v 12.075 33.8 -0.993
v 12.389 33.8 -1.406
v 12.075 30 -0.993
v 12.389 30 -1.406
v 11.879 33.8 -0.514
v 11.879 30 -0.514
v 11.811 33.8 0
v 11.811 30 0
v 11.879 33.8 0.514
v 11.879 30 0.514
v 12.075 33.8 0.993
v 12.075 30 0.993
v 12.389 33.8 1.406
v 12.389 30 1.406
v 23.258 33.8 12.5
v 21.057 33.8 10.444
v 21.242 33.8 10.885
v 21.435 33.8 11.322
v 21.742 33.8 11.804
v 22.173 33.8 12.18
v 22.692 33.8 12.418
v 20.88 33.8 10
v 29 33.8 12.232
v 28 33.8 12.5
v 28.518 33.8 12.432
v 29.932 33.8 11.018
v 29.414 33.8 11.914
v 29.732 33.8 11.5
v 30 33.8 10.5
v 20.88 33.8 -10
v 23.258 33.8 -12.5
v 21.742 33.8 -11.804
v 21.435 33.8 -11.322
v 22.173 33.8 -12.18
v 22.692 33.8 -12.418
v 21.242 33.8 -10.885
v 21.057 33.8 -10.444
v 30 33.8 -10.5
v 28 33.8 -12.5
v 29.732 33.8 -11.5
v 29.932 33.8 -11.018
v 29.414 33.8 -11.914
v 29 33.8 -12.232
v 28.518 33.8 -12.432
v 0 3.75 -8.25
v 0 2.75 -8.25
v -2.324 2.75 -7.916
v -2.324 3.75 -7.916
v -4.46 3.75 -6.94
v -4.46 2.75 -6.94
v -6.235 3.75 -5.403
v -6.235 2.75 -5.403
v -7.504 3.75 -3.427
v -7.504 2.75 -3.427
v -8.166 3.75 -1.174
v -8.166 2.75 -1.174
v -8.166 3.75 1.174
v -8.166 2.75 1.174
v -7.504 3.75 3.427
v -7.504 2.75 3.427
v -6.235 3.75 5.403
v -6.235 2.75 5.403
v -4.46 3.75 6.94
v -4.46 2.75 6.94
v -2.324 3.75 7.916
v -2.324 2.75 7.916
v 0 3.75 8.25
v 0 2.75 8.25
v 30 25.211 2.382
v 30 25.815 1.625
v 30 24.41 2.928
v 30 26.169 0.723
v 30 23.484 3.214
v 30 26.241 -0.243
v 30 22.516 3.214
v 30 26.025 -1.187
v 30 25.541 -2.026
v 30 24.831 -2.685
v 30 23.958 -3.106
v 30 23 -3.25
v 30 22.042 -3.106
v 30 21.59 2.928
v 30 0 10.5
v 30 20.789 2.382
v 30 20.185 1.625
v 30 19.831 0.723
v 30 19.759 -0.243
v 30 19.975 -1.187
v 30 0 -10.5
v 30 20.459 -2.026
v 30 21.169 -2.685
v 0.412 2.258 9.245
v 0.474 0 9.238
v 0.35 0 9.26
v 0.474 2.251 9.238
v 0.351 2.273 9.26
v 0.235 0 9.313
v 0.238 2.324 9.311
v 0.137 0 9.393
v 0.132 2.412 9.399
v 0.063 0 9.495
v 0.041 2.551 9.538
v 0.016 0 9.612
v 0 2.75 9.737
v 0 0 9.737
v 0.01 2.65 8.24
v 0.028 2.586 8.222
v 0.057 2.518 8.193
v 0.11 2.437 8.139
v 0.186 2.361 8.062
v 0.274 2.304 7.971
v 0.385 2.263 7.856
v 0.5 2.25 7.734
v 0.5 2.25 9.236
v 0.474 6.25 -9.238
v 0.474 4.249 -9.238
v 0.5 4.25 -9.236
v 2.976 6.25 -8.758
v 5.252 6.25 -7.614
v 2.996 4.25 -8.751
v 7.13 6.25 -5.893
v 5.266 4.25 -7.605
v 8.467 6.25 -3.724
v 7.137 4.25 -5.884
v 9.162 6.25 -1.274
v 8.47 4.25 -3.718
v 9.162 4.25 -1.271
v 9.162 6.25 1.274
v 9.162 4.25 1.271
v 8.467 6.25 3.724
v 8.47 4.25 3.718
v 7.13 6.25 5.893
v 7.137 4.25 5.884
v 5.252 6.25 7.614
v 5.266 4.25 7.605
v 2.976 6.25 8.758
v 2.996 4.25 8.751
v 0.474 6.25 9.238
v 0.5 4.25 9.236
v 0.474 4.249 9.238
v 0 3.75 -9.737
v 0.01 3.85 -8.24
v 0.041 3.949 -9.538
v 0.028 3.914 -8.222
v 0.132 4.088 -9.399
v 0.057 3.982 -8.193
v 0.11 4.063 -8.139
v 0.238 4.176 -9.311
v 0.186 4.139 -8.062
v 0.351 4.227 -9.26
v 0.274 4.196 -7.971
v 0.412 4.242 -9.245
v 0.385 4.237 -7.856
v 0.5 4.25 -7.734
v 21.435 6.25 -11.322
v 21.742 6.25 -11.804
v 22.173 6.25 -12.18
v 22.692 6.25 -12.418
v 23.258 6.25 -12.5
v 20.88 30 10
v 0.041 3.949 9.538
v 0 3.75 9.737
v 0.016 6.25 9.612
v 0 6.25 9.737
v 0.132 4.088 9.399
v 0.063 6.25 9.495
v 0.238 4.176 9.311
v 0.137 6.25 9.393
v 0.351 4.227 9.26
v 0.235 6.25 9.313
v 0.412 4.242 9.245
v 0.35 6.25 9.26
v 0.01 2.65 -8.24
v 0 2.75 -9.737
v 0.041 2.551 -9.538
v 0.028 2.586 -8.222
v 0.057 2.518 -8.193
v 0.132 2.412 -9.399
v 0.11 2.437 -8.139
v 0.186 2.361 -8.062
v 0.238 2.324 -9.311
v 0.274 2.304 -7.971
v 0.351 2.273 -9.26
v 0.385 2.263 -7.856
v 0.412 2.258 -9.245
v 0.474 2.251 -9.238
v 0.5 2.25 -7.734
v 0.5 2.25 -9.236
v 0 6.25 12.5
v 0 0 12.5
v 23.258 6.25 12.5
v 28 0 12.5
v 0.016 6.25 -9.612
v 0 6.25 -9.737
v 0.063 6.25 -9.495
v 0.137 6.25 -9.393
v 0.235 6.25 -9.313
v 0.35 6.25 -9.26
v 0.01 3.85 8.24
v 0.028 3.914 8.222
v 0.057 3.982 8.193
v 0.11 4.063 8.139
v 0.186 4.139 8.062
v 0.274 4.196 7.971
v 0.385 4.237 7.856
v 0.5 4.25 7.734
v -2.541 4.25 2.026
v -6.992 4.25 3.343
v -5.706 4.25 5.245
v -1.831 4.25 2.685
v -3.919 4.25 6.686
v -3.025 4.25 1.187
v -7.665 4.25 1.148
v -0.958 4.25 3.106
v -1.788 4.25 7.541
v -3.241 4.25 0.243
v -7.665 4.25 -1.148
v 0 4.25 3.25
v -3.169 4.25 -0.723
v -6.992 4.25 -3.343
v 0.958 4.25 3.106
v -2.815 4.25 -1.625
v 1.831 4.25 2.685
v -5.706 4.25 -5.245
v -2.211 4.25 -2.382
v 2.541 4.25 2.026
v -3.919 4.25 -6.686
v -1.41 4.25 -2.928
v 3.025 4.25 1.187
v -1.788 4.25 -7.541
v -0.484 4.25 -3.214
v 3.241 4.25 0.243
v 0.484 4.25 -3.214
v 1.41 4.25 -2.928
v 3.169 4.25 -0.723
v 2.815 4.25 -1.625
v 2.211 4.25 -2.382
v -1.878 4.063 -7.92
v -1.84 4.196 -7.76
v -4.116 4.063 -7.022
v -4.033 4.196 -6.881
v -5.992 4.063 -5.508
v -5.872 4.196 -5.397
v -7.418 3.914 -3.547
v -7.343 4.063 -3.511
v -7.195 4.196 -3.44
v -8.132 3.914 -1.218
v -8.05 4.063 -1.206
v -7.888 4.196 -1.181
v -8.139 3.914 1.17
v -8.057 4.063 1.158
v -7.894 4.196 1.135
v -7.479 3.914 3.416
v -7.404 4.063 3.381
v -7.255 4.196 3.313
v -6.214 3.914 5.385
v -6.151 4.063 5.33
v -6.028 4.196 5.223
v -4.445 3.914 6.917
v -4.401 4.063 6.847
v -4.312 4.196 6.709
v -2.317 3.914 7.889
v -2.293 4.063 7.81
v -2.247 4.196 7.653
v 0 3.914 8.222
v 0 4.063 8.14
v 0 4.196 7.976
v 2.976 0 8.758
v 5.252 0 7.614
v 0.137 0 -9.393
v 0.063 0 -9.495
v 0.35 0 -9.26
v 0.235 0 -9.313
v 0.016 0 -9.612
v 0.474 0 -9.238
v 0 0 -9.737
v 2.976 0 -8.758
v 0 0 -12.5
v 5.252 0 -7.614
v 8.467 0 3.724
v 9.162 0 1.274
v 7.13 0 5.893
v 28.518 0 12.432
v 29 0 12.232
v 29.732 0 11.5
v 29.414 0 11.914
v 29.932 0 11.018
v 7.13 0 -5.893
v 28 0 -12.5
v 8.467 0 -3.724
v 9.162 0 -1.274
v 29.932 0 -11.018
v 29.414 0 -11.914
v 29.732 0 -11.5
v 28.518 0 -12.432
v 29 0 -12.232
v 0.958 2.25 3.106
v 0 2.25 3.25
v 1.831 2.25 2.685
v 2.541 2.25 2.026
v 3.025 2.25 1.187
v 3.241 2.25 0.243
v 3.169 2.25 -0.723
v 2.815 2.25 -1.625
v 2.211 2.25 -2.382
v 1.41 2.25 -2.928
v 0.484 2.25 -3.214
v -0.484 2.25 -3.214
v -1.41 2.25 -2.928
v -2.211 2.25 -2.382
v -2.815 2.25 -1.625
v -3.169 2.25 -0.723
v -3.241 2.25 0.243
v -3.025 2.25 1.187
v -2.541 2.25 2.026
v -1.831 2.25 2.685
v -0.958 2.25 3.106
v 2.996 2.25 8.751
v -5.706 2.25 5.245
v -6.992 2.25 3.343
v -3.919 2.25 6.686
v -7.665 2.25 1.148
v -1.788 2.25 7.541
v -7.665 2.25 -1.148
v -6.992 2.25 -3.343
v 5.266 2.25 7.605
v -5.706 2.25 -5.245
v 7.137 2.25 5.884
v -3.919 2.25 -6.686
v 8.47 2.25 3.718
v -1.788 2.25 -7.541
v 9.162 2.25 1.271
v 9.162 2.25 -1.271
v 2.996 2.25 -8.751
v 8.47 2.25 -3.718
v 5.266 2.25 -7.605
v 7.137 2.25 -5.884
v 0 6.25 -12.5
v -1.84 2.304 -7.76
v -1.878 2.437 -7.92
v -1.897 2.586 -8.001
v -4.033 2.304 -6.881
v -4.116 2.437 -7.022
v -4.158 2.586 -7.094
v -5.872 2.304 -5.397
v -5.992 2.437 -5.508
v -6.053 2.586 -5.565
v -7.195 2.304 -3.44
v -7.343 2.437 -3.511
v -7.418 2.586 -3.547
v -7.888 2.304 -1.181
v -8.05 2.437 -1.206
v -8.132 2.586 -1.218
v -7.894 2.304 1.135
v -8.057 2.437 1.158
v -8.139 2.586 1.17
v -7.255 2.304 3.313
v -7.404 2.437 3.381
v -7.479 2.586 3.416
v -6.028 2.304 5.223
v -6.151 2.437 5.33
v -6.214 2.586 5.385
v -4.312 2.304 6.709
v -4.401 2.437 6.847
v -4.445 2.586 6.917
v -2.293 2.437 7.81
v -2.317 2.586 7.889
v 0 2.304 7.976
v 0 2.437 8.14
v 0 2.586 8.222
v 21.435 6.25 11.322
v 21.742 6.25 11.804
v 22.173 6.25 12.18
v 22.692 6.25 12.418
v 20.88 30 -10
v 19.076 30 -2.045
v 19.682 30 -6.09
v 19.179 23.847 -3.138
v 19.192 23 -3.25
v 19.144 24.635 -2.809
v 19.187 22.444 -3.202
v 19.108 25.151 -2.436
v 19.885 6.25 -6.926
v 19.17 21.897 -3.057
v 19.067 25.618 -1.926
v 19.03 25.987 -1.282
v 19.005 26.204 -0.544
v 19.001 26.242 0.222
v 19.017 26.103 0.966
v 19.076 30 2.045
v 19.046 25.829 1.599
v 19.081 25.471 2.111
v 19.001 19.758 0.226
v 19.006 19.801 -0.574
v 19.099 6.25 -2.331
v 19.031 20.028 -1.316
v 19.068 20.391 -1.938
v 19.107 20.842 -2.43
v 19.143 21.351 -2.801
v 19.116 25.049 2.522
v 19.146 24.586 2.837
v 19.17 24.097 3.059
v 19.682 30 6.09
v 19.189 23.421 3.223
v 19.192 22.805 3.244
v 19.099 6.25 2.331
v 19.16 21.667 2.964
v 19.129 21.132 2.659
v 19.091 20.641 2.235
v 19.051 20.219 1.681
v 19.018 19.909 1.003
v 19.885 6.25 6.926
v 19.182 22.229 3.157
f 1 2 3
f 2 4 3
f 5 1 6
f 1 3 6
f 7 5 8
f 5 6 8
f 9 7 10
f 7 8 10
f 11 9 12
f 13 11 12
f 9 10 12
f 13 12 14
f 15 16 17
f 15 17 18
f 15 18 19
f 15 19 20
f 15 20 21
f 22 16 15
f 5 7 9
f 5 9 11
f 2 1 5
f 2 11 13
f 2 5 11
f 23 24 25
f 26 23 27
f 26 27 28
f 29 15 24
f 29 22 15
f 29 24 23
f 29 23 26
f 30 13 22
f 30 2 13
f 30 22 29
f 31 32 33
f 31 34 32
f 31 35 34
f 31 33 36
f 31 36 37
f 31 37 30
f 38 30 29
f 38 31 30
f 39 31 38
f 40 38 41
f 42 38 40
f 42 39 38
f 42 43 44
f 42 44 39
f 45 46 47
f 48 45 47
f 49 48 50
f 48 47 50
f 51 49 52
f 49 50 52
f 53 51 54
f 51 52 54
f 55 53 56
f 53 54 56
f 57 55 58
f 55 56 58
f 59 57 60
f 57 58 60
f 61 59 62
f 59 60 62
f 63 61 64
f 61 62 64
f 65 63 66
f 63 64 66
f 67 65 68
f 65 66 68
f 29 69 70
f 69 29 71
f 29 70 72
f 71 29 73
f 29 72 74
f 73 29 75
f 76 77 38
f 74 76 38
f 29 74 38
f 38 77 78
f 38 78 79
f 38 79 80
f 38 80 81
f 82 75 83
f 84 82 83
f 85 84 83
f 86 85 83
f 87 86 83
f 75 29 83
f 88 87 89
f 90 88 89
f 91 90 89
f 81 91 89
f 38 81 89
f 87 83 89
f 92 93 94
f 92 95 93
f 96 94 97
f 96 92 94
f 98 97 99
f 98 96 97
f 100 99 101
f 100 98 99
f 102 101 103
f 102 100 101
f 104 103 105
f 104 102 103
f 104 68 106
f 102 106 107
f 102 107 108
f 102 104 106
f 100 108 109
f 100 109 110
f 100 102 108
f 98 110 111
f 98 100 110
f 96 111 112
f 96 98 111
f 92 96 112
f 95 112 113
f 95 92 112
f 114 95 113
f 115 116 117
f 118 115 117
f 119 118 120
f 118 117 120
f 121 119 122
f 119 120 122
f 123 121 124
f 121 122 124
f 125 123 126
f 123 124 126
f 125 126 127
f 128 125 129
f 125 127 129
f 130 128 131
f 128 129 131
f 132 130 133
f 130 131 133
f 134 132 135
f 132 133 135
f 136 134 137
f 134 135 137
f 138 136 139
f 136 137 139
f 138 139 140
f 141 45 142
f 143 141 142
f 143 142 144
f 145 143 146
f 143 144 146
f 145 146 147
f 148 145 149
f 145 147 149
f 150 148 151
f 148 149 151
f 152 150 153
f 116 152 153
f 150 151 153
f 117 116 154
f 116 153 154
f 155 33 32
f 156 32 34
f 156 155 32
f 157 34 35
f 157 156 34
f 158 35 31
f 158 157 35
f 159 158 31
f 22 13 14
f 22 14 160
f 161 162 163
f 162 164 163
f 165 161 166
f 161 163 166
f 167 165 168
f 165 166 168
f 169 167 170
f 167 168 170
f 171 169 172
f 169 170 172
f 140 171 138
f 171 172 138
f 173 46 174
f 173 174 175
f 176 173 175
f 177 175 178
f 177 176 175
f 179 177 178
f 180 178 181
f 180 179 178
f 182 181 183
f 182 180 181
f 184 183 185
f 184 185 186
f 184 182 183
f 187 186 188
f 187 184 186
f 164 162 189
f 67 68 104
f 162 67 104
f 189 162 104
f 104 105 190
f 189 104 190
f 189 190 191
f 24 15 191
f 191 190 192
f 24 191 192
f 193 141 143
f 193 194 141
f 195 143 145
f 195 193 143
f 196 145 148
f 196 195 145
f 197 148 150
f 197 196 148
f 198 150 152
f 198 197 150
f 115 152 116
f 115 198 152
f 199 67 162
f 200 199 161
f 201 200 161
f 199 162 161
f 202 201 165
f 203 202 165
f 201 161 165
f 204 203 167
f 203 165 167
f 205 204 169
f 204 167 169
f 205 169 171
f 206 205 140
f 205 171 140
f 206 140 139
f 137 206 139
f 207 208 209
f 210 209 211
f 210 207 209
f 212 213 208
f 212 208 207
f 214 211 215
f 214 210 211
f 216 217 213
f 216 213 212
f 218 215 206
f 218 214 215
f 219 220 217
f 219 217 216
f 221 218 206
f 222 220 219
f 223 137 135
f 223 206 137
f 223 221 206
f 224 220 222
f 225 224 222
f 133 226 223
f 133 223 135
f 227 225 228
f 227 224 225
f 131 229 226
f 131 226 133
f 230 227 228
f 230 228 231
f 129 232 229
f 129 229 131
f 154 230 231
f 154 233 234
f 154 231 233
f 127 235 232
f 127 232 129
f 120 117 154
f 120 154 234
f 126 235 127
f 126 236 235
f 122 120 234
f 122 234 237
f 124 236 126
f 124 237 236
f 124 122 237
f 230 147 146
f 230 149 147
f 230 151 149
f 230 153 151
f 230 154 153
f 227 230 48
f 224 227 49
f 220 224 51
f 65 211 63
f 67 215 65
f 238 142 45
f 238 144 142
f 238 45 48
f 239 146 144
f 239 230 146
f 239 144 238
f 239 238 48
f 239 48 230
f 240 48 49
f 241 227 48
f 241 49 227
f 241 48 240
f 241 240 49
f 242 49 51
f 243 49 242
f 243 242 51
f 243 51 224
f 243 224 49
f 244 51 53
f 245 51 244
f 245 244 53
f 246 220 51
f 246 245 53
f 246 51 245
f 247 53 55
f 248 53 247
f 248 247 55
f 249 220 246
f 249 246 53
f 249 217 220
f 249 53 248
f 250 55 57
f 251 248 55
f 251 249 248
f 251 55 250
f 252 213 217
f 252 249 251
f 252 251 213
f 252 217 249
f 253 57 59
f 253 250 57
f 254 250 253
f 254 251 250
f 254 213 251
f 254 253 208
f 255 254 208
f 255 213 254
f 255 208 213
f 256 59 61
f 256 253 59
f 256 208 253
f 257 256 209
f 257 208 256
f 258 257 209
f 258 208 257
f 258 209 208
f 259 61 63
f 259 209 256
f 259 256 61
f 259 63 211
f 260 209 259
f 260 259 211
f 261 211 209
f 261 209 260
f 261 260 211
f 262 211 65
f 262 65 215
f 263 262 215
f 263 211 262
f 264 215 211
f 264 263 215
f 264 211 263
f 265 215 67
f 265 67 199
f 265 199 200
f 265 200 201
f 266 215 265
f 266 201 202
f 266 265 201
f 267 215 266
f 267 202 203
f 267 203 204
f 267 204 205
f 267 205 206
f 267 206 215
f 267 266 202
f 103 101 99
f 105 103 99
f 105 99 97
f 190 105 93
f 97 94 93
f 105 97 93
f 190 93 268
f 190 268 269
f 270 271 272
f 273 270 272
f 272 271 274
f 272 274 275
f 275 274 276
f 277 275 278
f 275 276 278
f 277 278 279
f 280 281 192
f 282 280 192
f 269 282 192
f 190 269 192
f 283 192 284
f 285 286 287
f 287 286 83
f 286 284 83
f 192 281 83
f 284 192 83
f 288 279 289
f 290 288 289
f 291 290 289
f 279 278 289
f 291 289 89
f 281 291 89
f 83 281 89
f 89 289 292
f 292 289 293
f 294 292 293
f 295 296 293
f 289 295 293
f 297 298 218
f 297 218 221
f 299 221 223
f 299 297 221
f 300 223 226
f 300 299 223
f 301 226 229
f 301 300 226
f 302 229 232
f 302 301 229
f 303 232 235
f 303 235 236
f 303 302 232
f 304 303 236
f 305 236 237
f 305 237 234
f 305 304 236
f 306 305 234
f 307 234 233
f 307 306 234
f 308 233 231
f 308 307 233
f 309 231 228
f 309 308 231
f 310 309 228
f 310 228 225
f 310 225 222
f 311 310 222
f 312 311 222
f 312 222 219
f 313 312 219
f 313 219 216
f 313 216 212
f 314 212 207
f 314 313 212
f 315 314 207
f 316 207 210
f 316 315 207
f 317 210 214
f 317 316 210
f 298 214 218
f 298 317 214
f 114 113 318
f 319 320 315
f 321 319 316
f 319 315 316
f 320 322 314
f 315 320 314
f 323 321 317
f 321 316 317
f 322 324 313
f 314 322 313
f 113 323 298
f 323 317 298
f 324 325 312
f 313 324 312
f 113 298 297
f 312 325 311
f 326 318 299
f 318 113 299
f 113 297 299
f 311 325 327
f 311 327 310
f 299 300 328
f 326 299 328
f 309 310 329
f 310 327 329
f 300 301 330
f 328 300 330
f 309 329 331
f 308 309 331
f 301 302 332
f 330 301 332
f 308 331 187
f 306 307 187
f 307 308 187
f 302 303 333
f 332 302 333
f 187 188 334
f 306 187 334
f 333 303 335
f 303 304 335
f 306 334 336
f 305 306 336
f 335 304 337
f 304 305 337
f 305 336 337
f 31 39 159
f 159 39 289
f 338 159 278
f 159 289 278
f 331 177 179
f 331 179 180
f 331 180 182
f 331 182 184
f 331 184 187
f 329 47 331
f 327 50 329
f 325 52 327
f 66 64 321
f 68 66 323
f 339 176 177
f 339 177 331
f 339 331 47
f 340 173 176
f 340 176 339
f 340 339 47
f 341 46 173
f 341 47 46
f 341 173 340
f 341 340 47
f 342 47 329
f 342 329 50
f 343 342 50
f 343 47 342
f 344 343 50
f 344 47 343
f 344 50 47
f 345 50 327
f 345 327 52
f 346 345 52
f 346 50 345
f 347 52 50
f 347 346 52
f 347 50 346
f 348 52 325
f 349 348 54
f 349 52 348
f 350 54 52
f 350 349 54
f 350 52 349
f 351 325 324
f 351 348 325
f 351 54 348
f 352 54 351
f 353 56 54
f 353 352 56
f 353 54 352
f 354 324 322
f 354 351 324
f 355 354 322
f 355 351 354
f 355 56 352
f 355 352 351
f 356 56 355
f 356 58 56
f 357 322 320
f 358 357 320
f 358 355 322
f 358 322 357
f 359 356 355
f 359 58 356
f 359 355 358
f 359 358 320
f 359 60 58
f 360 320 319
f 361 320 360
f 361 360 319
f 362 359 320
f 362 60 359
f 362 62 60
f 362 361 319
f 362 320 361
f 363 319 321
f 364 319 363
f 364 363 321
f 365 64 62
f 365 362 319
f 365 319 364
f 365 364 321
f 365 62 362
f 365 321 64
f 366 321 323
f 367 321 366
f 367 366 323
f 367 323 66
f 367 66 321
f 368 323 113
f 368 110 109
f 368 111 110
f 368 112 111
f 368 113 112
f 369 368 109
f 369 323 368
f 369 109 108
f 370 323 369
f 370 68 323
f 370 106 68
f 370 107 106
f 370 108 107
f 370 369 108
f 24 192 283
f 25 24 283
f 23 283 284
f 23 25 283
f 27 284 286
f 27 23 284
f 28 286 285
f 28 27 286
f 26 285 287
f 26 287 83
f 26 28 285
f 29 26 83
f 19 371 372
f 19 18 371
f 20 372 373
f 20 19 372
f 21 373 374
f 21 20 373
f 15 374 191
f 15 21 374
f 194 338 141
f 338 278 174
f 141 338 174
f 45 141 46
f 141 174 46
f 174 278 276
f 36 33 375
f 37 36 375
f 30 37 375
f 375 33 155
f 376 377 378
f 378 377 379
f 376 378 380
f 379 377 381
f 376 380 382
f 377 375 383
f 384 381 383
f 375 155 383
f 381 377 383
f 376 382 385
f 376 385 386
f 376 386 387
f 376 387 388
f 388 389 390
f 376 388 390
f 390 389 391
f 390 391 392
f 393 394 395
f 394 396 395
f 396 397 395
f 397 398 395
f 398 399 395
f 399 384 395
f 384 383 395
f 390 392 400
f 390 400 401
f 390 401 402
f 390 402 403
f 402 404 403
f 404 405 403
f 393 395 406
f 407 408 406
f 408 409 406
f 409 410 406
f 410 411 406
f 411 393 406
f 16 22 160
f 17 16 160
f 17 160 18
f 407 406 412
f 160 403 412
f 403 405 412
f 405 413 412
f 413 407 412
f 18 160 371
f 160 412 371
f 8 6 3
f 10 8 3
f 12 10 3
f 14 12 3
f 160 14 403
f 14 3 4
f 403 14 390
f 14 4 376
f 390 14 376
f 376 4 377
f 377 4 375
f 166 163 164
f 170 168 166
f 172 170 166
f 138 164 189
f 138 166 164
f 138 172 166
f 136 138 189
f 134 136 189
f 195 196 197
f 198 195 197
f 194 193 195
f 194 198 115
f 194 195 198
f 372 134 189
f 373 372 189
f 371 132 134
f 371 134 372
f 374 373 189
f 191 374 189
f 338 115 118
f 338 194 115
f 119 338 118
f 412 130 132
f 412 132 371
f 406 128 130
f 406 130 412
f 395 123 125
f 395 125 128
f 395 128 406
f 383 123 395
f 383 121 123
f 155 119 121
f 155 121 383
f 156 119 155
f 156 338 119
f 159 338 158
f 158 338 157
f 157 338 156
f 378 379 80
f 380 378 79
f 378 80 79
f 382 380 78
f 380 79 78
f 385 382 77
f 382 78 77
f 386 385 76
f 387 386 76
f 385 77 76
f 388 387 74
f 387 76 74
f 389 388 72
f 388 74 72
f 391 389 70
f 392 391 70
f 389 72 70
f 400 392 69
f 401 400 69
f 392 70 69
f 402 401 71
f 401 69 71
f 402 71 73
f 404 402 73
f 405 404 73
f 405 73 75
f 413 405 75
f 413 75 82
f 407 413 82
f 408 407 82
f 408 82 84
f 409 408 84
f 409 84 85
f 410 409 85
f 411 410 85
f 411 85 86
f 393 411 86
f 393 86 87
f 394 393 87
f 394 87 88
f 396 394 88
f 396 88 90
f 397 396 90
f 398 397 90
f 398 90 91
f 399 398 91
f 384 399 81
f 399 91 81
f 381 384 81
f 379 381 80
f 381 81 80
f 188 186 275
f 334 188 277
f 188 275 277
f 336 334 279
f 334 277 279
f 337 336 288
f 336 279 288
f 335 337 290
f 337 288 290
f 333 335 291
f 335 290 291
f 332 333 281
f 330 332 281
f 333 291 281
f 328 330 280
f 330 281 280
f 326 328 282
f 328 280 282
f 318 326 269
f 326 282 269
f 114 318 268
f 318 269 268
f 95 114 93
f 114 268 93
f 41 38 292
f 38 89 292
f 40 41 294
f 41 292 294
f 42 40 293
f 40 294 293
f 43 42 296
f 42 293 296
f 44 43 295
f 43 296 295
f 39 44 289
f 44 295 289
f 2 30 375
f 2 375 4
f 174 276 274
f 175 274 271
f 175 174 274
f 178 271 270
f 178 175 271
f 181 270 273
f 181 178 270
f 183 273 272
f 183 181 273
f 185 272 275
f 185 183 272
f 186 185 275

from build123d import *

# Parameters (mm, degrees)
BOSS_EXTRUDE1_DEPTH     = 2.25
BOSS_EXTRUDE2_START     = 2.25
SKETCH1_4_R             = 3.25
BOSS_EXTRUDE2_DEPTH     = 2
BOSS_EXTRUDE3_START     = 4.25
BOSS_EXTRUDE3_DEPTH     = 2
BOSS_EXTRUDE6_DEPTH     = 33.8
BOSS_EXTRUDE7_DEPTH     = 3.8
FILLET1_R               = 2
FILLET2_R               = 2
FILLET3_R               = 0.5
CUT_EXTRUDE1_REACH      = 54.552
CUT_EXTRUDE1_END_RADIUS = 27.541666667
SKETCH6_R               = 3.25


with BuildPart() as part:
    # Sketch1 → Boss-Extrude1 (new body)
    with BuildSketch(Plane(origin=(0, 0, 0), x_dir=(1, 0, 0), z_dir=(0, 1, 0))):
        with BuildLine():
            Line((30, -12.5), (30, 12.5))
            Line((30, 12.5), (0, 12.5))
            Line((0, 12.5), (0, 9.25))
            ThreePointArc((0, 9.25), (9.25, 0), (0, -9.25))
            Line((0, -9.25), (0, -12.5))
            Line((0, -12.5), (30, -12.5))
        make_face()
    extrude(amount=BOSS_EXTRUDE1_DEPTH)

    # Sketch1<4> → Boss-Extrude2 (add)
    with BuildSketch(Plane(origin=(0, 0, 0), x_dir=(1, 0, 0), z_dir=(0, 1, 0)).offset(BOSS_EXTRUDE2_START)):
        with BuildLine():
            Line((30, -12.5), (30, 12.5))
            Line((30, 12.5), (0, 12.5))
            Line((0, 12.5), (0, 8.25))
            ThreePointArc((0, 8.25), (-8.25, 0), (0, -8.25))
            Line((0, -8.25), (0, -12.5))
            Line((0, -12.5), (30, -12.5))
        make_face()
        with Locations(Location((0, 0, 0), (0, 0, 270))):
            Circle(SKETCH1_4_R, mode=Mode.SUBTRACT)
    extrude(amount=BOSS_EXTRUDE2_DEPTH)

    # Sketch1<6> → Boss-Extrude3 (add)
    with BuildSketch(Plane(origin=(0, 0, 0), x_dir=(1, 0, 0), z_dir=(0, 1, 0)).offset(BOSS_EXTRUDE3_START)):
        with BuildLine():
            Line((0, -12.5), (22, -12.5))
            ThreePointArc((22, -12.5), (19, 0), (22, 12.5))
            Line((22, 12.5), (0, 12.5))
            Line((0, 12.5), (0, 9.25))
            ThreePointArc((0, 9.25), (9.25, 0), (0, -9.25))
            Line((0, -9.25), (0, -12.5))
        make_face()
        with BuildLine():
            Line((22, -12.5), (30, -12.5))
            Line((30, -12.5), (30, 12.5))
            Line((30, 12.5), (22, 12.5))
            ThreePointArc((22, 12.5), (19, 0), (22, -12.5))
        make_face()
    extrude(amount=BOSS_EXTRUDE3_DEPTH)

    # Sketch1<8> → Boss-Extrude6 (add)
    with BuildSketch(Plane(origin=(0, 0, 0), x_dir=(1, 0, 0), z_dir=(0, 1, 0))):
        with BuildLine():
            Line((22, -12.5), (30, -12.5))
            Line((30, -12.5), (30, 12.5))
            Line((30, 12.5), (22, 12.5))
            ThreePointArc((22, 12.5), (19, 0), (22, -12.5))
        make_face()
    extrude(amount=BOSS_EXTRUDE6_DEPTH)

    # Sketch3 → Boss-Extrude7 (add)
    with BuildSketch(Plane(origin=(0, 33.8, 0), x_dir=(1, 0, 0), z_dir=(0, 1, 0))):
        with BuildLine():
            Line((11, 0), (19, 0))
            ThreePointArc((19, 0), (19.473969858, 5.087552676), (20.879566153, 10))
            Line((20.879566153, 10), (11, 0))
        make_face()
        with BuildLine():
            ThreePointArc((20.879566153, -10), (19.473969858, -5.087552676), (19, 0))
            Line((19, 0), (11, 0))
            Line((11, 0), (20.879566153, -10))
        make_face()
        with BuildLine():
            ThreePointArc((20.879566153, 10), (19.473969858, 5.087552676), (19, 0))
            ThreePointArc((19, 0), (19.473969858, -5.087552676), (20.879566153, -10))
            ThreePointArc((20.879566153, -10), (21.408679185, -11.263939941), (22, -12.5))
            Line((22, -12.5), (30, -12.5))
            Line((30, -12.5), (30, 12.5))
            Line((30, 12.5), (22, 12.5))
            ThreePointArc((22, 12.5), (21.408679185, 11.263939941), (20.879566153, 10))
        make_face()
    extrude(amount=-BOSS_EXTRUDE7_DEPTH)

    # Fillet1
    fillet1_edges = [part.edges().sort_by_distance(p)[0] for p in [
        (11, 31.9, 0),
    ]]
    fillet(fillet1_edges, radius=FILLET1_R)

    # Fillet2
    fillet2_edges = [part.edges().sort_by_distance(p)[0] for p in [
        (30, 16.9, -12.5),
        (30, 16.9, 12.5),
        (22, 20.025, -12.5),
        (22, 20.025, 12.5),
    ]]
    fillet(fillet2_edges, radius=FILLET2_R)

    # Fillet3
    fillet3_edges = [part.edges().sort_by_distance(p)[0] for p in [
        (0, 1.125, 9.25),
        (0, 1.125, -9.25),
        (0, 2.25, -8.75),
        (0, 2.25, 8.75),
        (-8.25, 4.25, 0),
        (0, 4.25, 8.75),
        (-8.25, 2.25, 0),
        (0, 4.25, -8.75),
        (0, 5.25, -9.25),
        (0, 5.25, 9.25),
    ]]
    fillet(fillet3_edges, radius=FILLET3_R)

    # Cut-Extrude1: up to this cylinder (the profile starts inside it)
    cut_extrude1_end = Plane(origin=(46.541666667, 23, 0), z_dir=(0, -1, 0)) * Cylinder(CUT_EXTRUDE1_END_RADIUS, 165.187333333, mode=Mode.PRIVATE)
    # Sketch6 → Cut-Extrude1 (cut, up to the surface)
    with BuildSketch(Plane(origin=(30, 0, 0), x_dir=(0, 0, -1), z_dir=(1, 0, 0)), mode=Mode.PRIVATE) as cut_extrude1_sk1:
        with Locations((0, 23)):
            Circle(SKETCH6_R)
    cut_extrude1_tool1 = extrude(cut_extrude1_sk1.sketch, amount=-CUT_EXTRUDE1_REACH, mode=Mode.PRIVATE) & cut_extrude1_end
    add(cut_extrude1_tool1.solids().sort_by_distance((30, 23, 0))[0], mode=Mode.SUBTRACT)


solid = part.part
